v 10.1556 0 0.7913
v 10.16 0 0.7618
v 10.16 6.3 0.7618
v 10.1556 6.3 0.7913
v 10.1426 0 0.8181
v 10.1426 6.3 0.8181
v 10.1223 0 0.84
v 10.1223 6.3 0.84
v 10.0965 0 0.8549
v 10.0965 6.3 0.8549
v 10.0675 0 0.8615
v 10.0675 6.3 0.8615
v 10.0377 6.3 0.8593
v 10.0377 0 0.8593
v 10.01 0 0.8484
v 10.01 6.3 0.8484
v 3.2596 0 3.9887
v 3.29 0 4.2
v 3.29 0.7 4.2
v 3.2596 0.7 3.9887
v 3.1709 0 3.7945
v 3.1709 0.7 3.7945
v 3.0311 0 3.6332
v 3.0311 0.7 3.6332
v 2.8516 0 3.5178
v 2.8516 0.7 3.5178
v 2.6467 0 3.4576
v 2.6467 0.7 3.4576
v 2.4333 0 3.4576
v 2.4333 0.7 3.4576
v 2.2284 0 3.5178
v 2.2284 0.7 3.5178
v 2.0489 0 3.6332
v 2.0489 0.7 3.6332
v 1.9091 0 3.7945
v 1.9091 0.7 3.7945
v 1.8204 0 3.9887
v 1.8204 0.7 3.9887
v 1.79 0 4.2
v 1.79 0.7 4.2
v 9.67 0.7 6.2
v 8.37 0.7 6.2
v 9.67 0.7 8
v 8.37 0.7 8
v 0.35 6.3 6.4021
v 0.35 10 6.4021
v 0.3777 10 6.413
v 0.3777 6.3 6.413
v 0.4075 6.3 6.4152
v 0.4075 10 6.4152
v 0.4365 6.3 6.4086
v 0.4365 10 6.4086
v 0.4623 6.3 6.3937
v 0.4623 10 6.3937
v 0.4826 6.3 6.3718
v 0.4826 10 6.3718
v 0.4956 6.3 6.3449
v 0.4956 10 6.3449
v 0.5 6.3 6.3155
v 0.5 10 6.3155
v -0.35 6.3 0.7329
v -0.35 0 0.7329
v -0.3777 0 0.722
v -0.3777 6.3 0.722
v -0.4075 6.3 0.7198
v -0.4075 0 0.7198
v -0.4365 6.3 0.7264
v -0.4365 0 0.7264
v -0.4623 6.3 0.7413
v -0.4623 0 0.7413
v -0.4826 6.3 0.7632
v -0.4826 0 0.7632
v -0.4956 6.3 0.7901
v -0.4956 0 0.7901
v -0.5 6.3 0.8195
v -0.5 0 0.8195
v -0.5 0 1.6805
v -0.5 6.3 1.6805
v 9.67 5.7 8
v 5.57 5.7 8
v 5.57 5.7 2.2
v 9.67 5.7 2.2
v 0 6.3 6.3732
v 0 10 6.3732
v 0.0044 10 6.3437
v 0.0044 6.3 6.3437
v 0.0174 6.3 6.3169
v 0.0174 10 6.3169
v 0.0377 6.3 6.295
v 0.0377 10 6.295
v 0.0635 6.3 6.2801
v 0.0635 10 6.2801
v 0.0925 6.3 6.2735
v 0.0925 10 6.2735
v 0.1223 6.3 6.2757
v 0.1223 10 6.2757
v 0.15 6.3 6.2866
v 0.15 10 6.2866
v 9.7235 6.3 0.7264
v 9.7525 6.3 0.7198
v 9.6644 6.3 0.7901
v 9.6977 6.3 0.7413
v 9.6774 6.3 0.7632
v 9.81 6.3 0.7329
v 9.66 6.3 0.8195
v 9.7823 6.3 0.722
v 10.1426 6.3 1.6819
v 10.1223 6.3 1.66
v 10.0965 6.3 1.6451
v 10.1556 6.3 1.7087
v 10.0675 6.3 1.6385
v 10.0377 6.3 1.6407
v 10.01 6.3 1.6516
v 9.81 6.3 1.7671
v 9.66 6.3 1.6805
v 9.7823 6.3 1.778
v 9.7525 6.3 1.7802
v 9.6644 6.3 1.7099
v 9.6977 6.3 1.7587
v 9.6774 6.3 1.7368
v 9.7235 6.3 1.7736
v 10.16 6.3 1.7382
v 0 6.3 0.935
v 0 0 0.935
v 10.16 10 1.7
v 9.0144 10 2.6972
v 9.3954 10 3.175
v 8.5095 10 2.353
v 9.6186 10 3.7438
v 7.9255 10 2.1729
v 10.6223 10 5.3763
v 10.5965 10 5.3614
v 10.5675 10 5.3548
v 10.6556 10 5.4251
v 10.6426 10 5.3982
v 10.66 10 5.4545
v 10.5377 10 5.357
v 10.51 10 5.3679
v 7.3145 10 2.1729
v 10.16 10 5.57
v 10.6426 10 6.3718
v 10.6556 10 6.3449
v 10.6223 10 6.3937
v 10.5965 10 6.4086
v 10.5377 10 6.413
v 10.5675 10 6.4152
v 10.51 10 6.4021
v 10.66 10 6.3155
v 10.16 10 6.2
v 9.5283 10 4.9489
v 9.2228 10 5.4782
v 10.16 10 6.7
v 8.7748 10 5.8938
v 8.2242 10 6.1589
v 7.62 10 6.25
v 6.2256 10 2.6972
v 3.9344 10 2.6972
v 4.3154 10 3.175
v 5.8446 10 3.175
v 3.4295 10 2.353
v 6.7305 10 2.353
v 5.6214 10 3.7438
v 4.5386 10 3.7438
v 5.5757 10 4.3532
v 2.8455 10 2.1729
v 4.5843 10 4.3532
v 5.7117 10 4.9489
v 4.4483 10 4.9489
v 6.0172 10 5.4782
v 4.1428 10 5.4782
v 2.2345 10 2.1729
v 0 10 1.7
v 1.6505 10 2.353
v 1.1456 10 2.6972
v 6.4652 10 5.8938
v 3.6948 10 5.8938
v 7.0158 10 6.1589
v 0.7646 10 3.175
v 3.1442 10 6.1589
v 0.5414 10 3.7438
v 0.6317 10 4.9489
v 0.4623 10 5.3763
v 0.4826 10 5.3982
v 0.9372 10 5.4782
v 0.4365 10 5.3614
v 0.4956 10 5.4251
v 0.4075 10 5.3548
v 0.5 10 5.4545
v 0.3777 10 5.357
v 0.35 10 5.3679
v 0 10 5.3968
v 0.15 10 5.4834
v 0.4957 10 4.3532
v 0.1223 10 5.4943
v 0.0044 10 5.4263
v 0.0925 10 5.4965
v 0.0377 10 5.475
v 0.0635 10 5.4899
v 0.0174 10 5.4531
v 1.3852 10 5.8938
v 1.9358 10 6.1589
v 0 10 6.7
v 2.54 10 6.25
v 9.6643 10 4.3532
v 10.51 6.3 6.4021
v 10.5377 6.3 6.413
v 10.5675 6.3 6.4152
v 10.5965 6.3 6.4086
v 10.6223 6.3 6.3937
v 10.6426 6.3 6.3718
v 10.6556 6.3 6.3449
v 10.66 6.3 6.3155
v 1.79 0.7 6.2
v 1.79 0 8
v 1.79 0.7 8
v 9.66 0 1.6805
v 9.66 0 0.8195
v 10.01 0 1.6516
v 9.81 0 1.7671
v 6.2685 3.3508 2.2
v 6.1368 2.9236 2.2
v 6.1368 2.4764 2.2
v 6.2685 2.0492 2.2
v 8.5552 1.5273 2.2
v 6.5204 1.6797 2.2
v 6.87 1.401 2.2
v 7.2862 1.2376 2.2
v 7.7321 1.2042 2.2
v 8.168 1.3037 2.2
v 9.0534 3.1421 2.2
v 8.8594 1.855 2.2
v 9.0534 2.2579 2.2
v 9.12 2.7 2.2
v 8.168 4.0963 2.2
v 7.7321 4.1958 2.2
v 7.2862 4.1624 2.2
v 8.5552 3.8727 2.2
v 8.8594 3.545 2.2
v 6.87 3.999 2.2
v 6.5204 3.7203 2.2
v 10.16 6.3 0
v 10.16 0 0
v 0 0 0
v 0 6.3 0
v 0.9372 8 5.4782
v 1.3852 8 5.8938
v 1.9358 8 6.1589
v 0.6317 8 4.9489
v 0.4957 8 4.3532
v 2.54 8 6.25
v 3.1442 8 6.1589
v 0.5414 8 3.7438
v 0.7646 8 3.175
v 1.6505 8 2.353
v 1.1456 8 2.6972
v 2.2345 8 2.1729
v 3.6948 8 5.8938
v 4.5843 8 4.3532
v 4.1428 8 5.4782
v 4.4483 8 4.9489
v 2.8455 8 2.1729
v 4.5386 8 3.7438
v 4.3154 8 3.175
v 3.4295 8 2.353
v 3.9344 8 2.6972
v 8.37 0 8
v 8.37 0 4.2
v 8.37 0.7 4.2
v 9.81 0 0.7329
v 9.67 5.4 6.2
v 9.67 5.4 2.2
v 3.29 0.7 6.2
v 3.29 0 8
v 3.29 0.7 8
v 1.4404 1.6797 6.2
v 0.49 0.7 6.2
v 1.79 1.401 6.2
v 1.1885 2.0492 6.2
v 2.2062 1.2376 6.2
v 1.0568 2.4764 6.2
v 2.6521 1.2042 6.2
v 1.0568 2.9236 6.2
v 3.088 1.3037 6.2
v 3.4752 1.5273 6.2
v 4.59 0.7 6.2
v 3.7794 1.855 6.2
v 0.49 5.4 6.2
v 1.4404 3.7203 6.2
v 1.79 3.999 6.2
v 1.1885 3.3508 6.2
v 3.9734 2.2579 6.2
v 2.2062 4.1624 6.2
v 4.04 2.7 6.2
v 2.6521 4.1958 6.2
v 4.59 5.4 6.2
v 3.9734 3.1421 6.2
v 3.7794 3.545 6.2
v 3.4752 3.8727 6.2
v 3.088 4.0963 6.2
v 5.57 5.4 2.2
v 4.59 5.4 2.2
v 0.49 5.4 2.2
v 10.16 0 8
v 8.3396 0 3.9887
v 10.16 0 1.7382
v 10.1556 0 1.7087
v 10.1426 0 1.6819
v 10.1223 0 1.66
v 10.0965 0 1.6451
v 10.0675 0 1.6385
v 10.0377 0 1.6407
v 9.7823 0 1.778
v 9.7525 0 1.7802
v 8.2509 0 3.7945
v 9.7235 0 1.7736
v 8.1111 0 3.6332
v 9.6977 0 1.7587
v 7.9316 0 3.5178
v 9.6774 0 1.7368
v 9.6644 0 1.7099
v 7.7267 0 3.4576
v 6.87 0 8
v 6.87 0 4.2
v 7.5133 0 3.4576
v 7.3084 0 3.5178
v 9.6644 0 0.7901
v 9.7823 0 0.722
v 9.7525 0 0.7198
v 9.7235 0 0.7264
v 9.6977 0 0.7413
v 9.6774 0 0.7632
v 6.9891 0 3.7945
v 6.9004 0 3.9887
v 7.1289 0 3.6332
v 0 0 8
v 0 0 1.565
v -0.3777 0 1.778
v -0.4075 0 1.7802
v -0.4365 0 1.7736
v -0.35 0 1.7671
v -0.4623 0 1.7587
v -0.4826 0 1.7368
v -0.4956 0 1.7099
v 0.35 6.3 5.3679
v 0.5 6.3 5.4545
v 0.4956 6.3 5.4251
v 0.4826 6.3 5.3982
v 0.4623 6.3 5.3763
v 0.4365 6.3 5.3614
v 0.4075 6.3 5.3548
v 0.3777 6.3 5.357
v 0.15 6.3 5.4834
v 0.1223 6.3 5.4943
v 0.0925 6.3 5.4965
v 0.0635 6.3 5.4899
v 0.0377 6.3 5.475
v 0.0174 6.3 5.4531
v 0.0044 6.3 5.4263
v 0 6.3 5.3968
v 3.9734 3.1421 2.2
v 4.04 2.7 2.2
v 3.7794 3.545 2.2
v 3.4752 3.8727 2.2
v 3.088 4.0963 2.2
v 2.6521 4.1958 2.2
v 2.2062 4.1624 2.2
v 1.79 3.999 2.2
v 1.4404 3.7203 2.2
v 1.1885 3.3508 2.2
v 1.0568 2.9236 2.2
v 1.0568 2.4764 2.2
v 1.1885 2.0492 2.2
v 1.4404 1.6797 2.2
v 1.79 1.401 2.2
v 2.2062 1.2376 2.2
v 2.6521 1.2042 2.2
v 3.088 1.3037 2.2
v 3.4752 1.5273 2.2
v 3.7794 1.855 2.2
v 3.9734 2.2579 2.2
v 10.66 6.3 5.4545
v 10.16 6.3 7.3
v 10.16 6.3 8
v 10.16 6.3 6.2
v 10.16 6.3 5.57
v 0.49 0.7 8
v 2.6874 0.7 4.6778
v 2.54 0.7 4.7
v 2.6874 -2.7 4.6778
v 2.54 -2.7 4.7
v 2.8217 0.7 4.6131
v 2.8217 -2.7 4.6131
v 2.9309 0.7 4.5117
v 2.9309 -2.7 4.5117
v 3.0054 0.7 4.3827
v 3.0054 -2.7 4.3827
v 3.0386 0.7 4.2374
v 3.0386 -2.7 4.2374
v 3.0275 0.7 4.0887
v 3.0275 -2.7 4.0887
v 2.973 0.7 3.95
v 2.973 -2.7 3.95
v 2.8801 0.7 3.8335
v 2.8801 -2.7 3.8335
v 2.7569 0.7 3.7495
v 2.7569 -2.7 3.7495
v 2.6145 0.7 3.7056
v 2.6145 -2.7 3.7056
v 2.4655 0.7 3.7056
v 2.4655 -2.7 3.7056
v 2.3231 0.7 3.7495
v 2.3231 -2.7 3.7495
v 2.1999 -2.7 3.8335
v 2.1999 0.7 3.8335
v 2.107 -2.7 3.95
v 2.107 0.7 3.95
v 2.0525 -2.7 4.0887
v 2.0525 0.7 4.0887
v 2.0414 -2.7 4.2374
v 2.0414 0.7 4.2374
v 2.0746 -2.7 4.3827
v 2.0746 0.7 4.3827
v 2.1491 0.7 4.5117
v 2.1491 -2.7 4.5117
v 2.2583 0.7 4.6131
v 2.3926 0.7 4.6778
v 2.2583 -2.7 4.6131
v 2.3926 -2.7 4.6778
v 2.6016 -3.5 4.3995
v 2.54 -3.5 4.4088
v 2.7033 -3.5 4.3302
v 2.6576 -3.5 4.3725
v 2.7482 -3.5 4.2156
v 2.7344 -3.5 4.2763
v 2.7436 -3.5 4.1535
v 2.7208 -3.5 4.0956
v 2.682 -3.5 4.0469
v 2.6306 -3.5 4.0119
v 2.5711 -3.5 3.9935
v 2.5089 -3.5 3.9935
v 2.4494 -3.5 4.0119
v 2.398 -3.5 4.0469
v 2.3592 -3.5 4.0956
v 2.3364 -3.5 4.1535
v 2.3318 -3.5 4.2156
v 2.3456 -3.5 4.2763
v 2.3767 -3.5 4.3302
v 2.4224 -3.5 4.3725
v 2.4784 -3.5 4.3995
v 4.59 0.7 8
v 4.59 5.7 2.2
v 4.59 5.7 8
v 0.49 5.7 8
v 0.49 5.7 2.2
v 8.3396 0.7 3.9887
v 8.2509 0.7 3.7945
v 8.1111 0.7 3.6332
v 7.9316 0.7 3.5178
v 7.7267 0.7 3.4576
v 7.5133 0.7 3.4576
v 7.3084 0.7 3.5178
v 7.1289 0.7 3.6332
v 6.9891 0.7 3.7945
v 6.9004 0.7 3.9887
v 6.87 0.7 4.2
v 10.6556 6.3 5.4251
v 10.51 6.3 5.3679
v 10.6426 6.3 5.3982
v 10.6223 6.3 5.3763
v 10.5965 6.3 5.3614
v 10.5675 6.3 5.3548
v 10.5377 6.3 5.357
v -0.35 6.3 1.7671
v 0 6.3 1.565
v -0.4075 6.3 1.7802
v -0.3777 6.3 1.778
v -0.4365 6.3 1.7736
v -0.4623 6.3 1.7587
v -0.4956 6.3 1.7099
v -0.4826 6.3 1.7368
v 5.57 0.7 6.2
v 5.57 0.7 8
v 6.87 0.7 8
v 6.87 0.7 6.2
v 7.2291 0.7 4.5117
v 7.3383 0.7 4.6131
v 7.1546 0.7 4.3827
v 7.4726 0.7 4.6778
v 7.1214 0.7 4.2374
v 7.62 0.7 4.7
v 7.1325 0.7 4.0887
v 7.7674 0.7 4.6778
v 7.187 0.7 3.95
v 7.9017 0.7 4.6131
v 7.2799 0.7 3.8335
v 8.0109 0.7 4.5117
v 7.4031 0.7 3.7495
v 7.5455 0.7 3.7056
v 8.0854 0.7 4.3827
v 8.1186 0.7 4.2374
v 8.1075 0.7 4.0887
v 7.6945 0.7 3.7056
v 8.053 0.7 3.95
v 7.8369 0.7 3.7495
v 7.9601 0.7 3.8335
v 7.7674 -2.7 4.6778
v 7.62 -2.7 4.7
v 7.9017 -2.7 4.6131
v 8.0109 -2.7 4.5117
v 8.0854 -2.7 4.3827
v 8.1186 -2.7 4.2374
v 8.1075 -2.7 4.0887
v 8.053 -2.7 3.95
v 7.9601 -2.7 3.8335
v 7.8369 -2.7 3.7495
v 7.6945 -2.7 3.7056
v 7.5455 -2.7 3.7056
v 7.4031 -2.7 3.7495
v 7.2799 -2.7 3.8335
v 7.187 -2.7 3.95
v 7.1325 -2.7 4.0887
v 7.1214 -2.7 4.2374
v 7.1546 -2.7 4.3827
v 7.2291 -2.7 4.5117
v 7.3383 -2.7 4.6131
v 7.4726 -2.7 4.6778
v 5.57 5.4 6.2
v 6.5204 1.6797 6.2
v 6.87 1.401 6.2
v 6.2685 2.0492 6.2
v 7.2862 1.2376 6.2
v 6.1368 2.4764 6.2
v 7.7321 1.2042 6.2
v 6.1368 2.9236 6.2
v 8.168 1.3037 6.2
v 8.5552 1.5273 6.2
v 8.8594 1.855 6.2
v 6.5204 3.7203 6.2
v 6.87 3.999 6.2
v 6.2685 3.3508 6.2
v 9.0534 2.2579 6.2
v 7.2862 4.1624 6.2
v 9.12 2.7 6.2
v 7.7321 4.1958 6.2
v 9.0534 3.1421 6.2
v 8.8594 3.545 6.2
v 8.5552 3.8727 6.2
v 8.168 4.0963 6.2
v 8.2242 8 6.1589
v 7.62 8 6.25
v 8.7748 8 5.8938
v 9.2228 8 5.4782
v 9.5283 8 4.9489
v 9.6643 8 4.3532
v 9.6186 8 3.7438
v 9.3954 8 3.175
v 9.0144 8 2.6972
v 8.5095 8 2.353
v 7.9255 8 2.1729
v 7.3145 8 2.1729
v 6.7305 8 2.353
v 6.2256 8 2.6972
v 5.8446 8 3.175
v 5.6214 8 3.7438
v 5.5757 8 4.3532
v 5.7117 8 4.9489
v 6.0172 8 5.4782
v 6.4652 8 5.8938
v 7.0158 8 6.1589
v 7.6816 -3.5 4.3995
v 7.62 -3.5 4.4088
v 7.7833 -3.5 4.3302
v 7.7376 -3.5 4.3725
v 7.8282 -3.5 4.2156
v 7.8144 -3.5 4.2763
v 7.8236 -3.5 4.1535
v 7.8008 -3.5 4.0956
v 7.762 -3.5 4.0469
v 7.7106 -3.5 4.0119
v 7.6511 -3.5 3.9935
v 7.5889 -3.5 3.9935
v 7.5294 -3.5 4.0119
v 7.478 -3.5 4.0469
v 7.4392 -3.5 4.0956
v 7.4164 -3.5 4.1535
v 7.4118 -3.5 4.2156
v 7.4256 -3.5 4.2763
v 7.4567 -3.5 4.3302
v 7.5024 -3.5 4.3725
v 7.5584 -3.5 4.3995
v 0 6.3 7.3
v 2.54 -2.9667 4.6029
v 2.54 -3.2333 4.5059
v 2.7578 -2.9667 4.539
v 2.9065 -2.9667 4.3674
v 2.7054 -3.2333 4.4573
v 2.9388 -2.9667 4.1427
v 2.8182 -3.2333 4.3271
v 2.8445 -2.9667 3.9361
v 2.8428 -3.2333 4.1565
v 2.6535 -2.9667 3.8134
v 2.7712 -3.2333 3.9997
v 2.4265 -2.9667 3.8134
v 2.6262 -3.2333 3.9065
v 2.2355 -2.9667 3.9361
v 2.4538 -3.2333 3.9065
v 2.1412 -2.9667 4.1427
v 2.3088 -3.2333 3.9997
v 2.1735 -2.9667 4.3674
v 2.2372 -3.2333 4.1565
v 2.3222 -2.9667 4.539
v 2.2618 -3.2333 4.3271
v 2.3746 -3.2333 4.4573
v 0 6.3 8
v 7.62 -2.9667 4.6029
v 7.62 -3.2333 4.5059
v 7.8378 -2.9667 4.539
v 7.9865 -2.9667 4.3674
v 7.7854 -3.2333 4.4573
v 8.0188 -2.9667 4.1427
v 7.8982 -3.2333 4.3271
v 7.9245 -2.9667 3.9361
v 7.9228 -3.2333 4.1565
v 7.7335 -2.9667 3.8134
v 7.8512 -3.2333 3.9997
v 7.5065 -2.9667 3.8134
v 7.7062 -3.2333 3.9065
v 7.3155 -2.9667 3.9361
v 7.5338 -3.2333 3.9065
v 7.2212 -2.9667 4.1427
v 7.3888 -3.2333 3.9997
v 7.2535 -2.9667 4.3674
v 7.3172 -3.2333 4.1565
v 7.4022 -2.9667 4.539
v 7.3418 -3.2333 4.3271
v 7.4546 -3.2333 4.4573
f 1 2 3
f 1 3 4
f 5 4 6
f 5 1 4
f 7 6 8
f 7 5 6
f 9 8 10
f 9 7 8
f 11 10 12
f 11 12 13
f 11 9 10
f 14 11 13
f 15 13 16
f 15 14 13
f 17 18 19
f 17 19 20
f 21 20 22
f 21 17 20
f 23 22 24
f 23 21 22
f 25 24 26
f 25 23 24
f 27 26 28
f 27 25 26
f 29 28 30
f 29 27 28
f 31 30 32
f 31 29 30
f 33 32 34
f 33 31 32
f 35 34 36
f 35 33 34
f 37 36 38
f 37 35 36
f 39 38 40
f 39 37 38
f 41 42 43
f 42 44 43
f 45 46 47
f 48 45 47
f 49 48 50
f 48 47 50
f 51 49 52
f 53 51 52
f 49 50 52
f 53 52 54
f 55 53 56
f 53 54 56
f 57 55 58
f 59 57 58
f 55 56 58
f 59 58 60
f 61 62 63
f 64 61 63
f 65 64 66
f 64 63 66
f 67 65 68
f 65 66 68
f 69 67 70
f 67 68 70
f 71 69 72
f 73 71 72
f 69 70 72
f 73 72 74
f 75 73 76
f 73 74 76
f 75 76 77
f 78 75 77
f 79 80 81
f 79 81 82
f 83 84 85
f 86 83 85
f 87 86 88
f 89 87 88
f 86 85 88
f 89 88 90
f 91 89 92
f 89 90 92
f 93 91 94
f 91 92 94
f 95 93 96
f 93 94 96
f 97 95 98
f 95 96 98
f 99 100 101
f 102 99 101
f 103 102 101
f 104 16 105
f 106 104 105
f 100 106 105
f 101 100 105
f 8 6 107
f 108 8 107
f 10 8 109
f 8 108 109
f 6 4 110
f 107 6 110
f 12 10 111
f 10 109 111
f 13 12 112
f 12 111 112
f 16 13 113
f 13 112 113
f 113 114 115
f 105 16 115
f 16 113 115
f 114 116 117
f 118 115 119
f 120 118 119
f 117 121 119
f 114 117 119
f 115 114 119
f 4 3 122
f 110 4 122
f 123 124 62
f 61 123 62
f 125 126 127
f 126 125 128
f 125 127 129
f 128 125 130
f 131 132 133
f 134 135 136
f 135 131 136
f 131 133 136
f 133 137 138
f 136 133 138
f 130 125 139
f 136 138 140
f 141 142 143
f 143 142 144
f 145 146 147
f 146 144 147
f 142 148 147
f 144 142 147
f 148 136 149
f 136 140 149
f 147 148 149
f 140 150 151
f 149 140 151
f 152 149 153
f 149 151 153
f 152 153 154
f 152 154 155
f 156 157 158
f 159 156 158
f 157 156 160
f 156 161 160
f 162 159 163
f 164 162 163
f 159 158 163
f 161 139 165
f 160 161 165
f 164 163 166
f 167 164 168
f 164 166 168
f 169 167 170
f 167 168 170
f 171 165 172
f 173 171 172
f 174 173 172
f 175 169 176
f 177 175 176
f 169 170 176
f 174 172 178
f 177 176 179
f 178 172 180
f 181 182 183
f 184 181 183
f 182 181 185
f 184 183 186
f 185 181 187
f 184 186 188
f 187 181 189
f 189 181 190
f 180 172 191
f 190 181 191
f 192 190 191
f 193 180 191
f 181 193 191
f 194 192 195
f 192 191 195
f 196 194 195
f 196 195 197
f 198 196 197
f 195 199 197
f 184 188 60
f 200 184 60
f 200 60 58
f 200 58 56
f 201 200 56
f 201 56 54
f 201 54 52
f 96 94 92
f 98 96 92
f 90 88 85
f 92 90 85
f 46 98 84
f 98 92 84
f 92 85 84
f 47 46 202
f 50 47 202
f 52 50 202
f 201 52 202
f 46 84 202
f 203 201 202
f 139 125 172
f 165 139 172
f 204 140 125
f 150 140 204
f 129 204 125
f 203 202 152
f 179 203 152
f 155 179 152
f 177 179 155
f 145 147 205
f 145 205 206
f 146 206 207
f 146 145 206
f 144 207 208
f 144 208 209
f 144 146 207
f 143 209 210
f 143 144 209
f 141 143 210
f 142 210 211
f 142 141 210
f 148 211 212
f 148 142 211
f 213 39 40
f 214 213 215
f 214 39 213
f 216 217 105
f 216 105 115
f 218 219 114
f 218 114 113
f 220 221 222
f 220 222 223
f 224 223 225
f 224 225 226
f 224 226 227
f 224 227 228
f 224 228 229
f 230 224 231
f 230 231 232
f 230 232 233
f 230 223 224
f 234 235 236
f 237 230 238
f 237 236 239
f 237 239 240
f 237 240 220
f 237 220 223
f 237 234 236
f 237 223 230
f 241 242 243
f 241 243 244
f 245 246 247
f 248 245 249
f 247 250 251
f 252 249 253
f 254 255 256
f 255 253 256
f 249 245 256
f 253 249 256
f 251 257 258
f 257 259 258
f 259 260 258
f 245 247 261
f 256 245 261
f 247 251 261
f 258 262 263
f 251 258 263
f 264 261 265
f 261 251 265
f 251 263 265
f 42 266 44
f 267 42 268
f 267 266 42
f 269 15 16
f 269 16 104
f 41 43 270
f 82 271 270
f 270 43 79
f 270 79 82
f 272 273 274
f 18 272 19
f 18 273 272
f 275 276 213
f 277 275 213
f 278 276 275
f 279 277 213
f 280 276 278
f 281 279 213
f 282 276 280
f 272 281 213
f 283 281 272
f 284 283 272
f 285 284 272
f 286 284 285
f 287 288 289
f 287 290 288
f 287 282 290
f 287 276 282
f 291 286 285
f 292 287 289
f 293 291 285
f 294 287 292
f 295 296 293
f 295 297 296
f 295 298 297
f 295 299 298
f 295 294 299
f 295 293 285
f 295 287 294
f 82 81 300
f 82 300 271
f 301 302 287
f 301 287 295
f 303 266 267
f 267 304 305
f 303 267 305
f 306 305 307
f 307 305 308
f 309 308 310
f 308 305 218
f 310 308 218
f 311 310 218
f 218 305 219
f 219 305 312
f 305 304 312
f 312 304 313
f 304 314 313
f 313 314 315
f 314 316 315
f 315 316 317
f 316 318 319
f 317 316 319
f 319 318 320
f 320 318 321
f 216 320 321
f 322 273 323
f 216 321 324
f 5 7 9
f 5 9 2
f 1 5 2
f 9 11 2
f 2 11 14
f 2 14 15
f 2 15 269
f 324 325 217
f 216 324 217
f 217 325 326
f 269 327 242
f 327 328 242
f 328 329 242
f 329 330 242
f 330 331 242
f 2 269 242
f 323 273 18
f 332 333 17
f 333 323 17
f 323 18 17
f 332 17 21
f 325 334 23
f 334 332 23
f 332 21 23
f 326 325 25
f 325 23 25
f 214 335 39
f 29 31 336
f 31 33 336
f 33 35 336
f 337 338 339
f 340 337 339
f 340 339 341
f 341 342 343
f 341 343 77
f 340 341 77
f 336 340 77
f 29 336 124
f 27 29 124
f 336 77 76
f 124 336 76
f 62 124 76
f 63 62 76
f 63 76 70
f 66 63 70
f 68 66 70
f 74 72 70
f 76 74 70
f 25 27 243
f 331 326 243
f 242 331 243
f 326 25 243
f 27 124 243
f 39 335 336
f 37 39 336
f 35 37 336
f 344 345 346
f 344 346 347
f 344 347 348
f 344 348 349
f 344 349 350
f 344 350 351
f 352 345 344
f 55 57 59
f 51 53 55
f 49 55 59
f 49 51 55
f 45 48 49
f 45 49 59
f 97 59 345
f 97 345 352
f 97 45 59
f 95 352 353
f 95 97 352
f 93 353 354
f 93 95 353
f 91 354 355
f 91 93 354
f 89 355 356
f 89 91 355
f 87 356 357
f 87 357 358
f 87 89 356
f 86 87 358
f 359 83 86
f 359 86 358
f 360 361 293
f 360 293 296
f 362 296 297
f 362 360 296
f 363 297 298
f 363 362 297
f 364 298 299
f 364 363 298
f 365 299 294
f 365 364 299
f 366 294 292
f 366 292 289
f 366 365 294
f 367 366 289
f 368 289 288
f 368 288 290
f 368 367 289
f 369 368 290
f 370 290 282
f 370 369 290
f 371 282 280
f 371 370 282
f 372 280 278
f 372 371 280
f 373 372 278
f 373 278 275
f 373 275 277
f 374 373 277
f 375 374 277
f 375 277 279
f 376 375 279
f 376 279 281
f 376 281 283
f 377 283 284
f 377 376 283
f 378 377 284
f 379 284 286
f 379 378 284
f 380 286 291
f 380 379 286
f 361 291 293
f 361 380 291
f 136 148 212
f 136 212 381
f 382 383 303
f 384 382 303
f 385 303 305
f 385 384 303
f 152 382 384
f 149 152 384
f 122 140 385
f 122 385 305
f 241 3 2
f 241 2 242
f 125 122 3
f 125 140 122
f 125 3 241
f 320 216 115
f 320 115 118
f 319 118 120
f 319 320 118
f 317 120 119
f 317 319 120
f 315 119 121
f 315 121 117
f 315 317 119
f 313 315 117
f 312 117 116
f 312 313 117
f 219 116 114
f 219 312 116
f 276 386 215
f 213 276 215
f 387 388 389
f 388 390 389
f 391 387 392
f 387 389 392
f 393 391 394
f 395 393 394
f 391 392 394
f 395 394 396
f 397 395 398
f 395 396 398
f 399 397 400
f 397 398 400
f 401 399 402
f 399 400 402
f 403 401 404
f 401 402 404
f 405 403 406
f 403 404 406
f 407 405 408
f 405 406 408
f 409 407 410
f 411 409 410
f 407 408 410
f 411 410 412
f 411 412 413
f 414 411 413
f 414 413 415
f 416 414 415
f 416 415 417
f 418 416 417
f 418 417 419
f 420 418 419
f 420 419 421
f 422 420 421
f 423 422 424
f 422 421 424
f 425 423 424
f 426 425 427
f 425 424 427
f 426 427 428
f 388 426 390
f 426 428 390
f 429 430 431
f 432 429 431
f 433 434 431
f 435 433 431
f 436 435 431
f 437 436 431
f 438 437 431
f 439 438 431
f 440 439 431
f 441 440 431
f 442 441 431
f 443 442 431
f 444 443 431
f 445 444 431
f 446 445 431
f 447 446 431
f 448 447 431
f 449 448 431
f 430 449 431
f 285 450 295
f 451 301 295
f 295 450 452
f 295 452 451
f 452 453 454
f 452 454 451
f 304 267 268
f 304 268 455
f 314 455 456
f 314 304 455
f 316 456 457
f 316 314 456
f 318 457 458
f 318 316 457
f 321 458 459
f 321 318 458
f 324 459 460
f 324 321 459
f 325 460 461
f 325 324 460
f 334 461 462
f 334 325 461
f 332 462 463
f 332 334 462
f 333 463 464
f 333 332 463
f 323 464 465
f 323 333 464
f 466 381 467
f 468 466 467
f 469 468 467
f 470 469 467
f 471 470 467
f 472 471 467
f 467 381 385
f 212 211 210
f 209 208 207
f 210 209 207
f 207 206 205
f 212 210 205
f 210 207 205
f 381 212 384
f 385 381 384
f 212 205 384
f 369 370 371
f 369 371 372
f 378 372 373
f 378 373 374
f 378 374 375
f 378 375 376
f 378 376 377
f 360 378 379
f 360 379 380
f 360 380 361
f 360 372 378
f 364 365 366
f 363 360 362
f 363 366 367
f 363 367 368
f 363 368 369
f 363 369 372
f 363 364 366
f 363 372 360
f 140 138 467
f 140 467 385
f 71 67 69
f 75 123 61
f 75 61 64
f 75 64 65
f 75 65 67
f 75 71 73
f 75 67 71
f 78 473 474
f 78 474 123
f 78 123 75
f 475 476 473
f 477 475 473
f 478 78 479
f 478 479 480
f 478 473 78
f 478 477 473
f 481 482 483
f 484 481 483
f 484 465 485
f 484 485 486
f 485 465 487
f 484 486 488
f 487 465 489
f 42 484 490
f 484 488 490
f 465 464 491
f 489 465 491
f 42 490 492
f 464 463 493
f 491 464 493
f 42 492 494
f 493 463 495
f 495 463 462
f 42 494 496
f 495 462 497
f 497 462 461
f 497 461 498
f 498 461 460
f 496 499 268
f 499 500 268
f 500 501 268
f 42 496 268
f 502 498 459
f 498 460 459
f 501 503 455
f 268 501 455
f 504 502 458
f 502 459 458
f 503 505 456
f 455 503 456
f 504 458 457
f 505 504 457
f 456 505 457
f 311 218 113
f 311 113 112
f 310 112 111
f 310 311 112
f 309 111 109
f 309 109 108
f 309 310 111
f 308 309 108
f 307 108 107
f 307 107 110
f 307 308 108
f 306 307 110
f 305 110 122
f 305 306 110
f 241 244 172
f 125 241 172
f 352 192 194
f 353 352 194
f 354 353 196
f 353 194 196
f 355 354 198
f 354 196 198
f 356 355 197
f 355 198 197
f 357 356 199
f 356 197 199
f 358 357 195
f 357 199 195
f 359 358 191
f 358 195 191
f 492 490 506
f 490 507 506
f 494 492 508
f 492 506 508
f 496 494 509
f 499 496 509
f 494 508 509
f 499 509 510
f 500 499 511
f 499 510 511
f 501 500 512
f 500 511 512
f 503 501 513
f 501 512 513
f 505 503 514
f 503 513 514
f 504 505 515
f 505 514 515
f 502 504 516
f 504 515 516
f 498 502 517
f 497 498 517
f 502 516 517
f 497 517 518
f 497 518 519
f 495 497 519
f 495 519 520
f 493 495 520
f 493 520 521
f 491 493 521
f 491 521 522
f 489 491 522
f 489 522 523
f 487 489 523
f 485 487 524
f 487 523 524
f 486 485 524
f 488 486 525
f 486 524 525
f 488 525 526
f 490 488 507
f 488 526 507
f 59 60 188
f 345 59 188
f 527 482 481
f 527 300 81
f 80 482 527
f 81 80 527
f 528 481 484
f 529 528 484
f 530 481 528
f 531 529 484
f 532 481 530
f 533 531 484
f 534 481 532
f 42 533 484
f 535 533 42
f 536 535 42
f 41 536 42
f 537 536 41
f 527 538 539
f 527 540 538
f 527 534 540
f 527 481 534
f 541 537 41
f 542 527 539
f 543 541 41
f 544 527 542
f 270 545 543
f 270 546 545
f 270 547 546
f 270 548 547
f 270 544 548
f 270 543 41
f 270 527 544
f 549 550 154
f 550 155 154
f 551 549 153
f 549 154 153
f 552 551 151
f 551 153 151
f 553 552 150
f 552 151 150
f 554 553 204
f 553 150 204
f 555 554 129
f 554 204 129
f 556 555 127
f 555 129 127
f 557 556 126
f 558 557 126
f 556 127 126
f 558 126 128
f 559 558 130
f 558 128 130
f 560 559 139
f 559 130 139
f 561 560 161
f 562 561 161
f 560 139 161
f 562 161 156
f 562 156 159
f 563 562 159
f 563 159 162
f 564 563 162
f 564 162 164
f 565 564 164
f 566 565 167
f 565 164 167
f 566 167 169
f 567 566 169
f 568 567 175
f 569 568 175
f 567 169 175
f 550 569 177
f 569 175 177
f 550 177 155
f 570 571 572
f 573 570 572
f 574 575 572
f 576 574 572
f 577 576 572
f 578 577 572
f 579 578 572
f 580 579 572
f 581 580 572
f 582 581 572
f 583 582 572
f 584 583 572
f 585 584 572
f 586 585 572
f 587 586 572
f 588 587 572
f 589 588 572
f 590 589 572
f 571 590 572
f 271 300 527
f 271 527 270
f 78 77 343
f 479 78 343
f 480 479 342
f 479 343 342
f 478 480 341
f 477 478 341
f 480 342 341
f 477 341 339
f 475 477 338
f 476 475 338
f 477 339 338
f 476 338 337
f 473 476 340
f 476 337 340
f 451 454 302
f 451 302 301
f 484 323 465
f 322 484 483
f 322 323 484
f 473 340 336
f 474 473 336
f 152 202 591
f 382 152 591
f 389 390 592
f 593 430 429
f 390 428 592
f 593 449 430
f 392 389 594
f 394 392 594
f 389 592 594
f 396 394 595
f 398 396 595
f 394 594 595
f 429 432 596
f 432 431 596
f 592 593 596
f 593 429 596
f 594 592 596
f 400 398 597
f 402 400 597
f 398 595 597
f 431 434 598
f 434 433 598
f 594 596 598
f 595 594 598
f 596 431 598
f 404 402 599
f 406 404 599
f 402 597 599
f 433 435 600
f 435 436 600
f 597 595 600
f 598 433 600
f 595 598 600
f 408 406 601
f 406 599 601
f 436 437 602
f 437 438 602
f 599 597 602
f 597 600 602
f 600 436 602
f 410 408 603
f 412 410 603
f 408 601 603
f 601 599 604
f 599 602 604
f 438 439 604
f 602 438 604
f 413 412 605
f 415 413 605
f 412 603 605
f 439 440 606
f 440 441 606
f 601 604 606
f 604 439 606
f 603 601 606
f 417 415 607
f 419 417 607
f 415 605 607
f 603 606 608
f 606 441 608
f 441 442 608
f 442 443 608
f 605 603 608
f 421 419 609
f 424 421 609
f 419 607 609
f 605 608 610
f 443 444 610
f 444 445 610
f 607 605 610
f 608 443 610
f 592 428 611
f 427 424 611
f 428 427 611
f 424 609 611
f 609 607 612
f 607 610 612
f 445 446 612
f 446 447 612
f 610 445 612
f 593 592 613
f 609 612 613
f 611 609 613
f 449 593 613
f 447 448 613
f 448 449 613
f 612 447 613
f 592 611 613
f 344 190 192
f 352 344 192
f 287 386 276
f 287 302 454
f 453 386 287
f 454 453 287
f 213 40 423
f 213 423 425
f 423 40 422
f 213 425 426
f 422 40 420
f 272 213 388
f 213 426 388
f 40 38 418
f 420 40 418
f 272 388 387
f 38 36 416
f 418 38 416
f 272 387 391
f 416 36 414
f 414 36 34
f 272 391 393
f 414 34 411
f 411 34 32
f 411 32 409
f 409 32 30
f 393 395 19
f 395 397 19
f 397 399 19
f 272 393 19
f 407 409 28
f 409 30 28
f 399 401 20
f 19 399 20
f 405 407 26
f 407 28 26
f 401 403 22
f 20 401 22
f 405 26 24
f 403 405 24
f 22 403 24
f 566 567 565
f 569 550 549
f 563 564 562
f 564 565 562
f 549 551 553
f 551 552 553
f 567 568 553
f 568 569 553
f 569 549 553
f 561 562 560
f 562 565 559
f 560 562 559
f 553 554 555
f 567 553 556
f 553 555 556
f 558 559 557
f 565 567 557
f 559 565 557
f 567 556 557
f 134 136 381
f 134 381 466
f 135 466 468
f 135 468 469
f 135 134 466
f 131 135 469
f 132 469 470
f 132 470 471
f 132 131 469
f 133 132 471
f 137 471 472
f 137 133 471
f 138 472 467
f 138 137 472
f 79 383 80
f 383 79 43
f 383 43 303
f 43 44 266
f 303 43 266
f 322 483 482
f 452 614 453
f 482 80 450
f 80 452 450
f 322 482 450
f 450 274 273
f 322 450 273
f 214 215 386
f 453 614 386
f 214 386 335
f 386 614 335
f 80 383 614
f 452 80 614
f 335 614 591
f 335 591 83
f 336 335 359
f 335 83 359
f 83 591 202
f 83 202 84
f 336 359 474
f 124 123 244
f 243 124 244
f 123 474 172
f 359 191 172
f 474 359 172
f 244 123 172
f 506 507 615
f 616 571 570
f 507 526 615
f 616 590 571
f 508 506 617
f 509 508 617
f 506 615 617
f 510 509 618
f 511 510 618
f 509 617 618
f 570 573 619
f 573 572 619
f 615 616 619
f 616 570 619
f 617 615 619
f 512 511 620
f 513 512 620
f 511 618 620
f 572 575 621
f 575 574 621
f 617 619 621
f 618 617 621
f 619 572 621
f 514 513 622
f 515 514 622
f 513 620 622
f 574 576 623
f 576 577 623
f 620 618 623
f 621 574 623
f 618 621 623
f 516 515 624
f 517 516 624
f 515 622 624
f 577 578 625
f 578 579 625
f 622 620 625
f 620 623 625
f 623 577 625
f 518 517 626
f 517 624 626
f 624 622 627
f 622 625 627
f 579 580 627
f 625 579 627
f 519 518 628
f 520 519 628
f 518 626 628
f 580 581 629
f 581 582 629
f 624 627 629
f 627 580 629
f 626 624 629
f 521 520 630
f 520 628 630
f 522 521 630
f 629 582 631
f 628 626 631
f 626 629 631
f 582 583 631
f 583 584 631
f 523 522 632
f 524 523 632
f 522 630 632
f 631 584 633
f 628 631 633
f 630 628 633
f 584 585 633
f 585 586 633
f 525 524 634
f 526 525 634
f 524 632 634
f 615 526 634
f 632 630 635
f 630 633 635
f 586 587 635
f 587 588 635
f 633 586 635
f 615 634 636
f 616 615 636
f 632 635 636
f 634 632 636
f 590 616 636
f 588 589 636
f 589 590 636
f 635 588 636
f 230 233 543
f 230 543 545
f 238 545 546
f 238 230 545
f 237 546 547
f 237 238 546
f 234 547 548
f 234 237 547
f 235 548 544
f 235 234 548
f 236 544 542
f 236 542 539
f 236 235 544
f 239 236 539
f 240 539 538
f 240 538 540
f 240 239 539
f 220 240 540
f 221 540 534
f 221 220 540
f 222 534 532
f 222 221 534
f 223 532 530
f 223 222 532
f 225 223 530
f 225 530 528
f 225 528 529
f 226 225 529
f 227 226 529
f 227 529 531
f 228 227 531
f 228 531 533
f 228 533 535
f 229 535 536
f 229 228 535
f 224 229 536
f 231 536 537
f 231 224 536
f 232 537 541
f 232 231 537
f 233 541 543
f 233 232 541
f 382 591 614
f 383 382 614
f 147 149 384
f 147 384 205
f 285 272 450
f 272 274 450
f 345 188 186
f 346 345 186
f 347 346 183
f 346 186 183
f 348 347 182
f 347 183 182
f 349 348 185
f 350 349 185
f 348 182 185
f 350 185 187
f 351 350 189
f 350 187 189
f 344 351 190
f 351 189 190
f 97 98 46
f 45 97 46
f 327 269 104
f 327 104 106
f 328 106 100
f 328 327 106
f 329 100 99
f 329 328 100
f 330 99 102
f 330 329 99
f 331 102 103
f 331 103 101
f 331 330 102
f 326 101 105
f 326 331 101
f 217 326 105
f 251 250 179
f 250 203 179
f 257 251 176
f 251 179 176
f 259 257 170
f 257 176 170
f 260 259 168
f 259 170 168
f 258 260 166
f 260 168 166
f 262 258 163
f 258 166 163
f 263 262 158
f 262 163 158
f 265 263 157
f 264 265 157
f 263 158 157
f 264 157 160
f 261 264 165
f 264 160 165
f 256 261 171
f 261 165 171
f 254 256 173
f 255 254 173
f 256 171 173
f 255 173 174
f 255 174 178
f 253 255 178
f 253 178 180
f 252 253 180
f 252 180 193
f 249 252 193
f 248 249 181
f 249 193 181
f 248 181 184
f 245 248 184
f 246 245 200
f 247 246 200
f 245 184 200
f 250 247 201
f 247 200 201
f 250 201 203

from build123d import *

# Parameters (mm, degrees)
BOSS_EXTRUDE1_DEPTH      = 10.16
SKETCH2_W                = 4.1
SKETCH2_H                = 5
CUT_EXTRUDE1_DEPTH       = 5.8
SKETCH3_W                = 4.1
SKETCH3_H                = 5
CUT_EXTRUDE2_DEPTH       = 5.8
CUT_EXTRUDE3_DEPTH       = 1
CUT_EXTRUDE4_DEPTH       = 1
BOSS_EXTRUDE2_DEPTH      = 2
BOSS_EXTRUDE2_DEPTH_BACK = 2
SKETCH6_W                = 4.1
SKETCH6_H                = 4.7
SKETCH6_R                = 1.5
BOSS_EXTRUDE3_DEPTH      = 2
BOSS_EXTRUDE3_DEPTH_BACK = 2
SKETCH7_W                = 4.1
SKETCH7_H                = 4.7
SKETCH7_R                = 1.5
SKETCH10_W               = 2.05
SKETCH10_H               = 2
SKETCH11_W               = 2.05
SKETCH11_H               = 2
BOSS_EXTRUDE4_DEPTH      = 6.3
CUT_EXTRUDE5_DEPTH       = 6.3
CUT_EXTRUDE6_DEPTH       = 3.7
BOSS_EXTRUDE5_DEPTH      = 3.7


with BuildPart() as part:
    # Sketch1 → Boss-Extrude1 (new body)
    with BuildSketch(Plane(origin=(0, 0, 0), x_dir=(0, 0, -1), z_dir=(1, 0, 0))):
        Polygon((-8, 0), (0, 0), (0, 6.3), (-1.7, 10), (-6.7, 10), (-7.3, 6.3), (-8, 6.3), align=None)
    extrude(amount=BOSS_EXTRUDE1_DEPTH)

    # Sketch2 → Cut-Extrude1 (cut)
    with BuildSketch(Plane.XY.offset(8)):
        with Locations((2.54, 3.2)):
            Rectangle(SKETCH2_W, SKETCH2_H)
    extrude(amount=-CUT_EXTRUDE1_DEPTH, mode=Mode.SUBTRACT)

    # Sketch3 → Cut-Extrude2 (cut)
    with BuildSketch(Plane.XY.offset(8)):
        with Locations((7.62, 3.2)):
            Rectangle(SKETCH3_W, SKETCH3_H)
    extrude(amount=-CUT_EXTRUDE2_DEPTH, mode=Mode.SUBTRACT)

    # Sketch4 → Cut-Extrude3 (cut)
    with BuildSketch(Plane(origin=(0, 0, 0), x_dir=(-1, 0, 0), z_dir=(0, 1, 0))):
        with BuildLine():
            Line((-1.79, 4.2), (-1.79, 8))
            Line((-1.79, 8), (-3.29, 8))
            Line((-3.29, 8), (-3.29, 4.2))
            ThreePointArc((-3.29, 4.2), (-2.54, 3.45), (-1.79, 4.2))
        make_face()
    extrude(amount=CUT_EXTRUDE3_DEPTH, mode=Mode.SUBTRACT)

    # Sketch5 → Cut-Extrude4 (cut)
    with BuildSketch(Plane(origin=(0, 0, 0), x_dir=(-1, 0, 0), z_dir=(0, 1, 0))):
        with BuildLine():
            Line((-6.87, 4.2), (-6.87, 8))
            Line((-6.87, 8), (-8.37, 8))
            Line((-8.37, 8), (-8.37, 4.2))
            ThreePointArc((-8.37, 4.2), (-7.62, 3.45), (-6.87, 4.2))
        make_face()
    extrude(amount=CUT_EXTRUDE4_DEPTH, mode=Mode.SUBTRACT)

    # Sketch6 → Boss-Extrude2 (add, two sides: drawn at the far end of the back side and taken through both)
    with BuildSketch(Plane.XY.offset(4.2).offset(-BOSS_EXTRUDE2_DEPTH_BACK)):
        with Locations((2.54, 3.05)):
            Rectangle(SKETCH6_W, SKETCH6_H)
        with Locations((2.54, 2.7)):
            Circle(SKETCH6_R, mode=Mode.SUBTRACT)
    extrude(amount=BOSS_EXTRUDE2_DEPTH + BOSS_EXTRUDE2_DEPTH_BACK)

    # Sketch7 → Boss-Extrude3 (add, two sides: drawn at the far end of the back side and taken through both)
    with BuildSketch(Plane.XY.offset(4.2).offset(-BOSS_EXTRUDE3_DEPTH_BACK)):
        with Locations((7.62, 3.05)):
            Rectangle(SKETCH7_W, SKETCH7_H)
        with Locations((7.62, 2.7)):
            Circle(SKETCH7_R, mode=Mode.SUBTRACT)
    extrude(amount=BOSS_EXTRUDE3_DEPTH + BOSS_EXTRUDE3_DEPTH_BACK)

    # Sketch8 → Revolve1 (revolve)
    with BuildSketch(Plane.XY.offset(4.2), mode=Mode.PRIVATE) as revolve1_sk:
        Polygon((2.54, 0.7), (3.04, 0.7), (3.04, -2.7), (2.748823813, -3.5), (2.54, -3.5), align=None)
    revolve(revolve1_sk.sketch.rotate(Axis((2.54, -3.5, 4.2), (0, 1, 0)), 270), axis=Axis((2.54, -3.5, 4.2), (0, 1, 0)))

    # Sketch9 → Revolve2 (revolve)
    with BuildSketch(Plane.XY.offset(4.2), mode=Mode.PRIVATE) as revolve2_sk:
        Polygon((7.62, 0.7), (8.12, 0.7), (8.12, -2.7), (7.828823813, -3.5), (7.62, -3.5), align=None)
    revolve(revolve2_sk.sketch.rotate(Axis((7.62, -3.5, 4.2), (0, 1, 0)), 270), axis=Axis((7.62, -3.5, 4.2), (0, 1, 0)))

    # Sketch10 → Cut-Revolve1 (revolve, cut)
    with BuildSketch(Plane.XY.offset(4.2), mode=Mode.PRIVATE) as cut_revolve1_sk:
        with Locations((3.565, 9)):
            Rectangle(SKETCH10_W, SKETCH10_H)
    revolve(cut_revolve1_sk.sketch.rotate(Axis((2.54, 8, 4.2), (0, 1, 0)), 270), axis=Axis((2.54, 8, 4.2), (0, 1, 0)), mode=Mode.SUBTRACT)

    # Sketch11 → Cut-Revolve2 (revolve, cut)
    with BuildSketch(Plane.XY.offset(4.2), mode=Mode.PRIVATE) as cut_revolve2_sk:
        with Locations((8.645, 9)):
            Rectangle(SKETCH11_W, SKETCH11_H)
    revolve(cut_revolve2_sk.sketch.rotate(Axis((7.62, 8, 4.2), (0, 1, 0)), 270), axis=Axis((7.62, 8, 4.2), (0, 1, 0)), mode=Mode.SUBTRACT)

    # Sketch12 → Boss-Extrude4 (add)
    with BuildSketch(Plane(origin=(0, 0, 0), x_dir=(-1, 0, 0), z_dir=(0, 1, 0))):
        with BuildLine():
            Line((0.35, 1.767072594), (0, 1.565))
            Line((0, 1.565), (0, 0.935))
            Line((0, 0.935), (0.35, 0.732927406))
            ThreePointArc((0.35, 0.732927406), (0.45, 0.732927406), (0.5, 0.819529946))
            Line((0.5, 0.819529946), (0.5, 1.680470054))
            ThreePointArc((0.5, 1.680470054), (0.45, 1.767072594), (0.35, 1.767072594))
        make_face()
    extrude(amount=BOSS_EXTRUDE4_DEPTH)

    # Sketch13 → Cut-Extrude5 (cut)
    with BuildSketch(Plane(origin=(0, 0, 0), x_dir=(-1, 0, 0), z_dir=(0, 1, 0))):
        with BuildLine():
            Line((-9.81, 1.767072594), (-10.01, 1.65160254))
            ThreePointArc((-10.01, 1.65160254), (-10.11, 1.65160254), (-10.16, 1.738205081))
            Line((-10.16, 1.738205081), (-10.16, 1.865))
            Line((-10.16, 1.865), (-10.46, 1.865))
            Line((-10.46, 1.865), (-10.46, 0.635))
            Line((-10.46, 0.635), (-10.16, 0.635))
            Line((-10.16, 0.635), (-10.16, 0.761794919))
            ThreePointArc((-10.16, 0.761794919), (-10.11, 0.84839746), (-10.01, 0.84839746))
            Line((-10.01, 0.84839746), (-9.81, 0.732927406))
            ThreePointArc((-9.81, 0.732927406), (-9.71, 0.732927406), (-9.66, 0.819529946))
            Line((-9.66, 0.819529946), (-9.66, 1.680470054))
            ThreePointArc((-9.66, 1.680470054), (-9.71, 1.767072594), (-9.81, 1.767072594))
        make_face()
    extrude(amount=CUT_EXTRUDE5_DEPTH, mode=Mode.SUBTRACT)

    # Sketch14 → Cut-Extrude6 (cut)
    with BuildSketch(Plane(origin=(0, 10, 0), x_dir=(-1, 0, 0), z_dir=(0, 1, 0))):
        with BuildLine():
            Line((0.2, 6.4), (0, 6.4))
            Line((0, 6.4), (0, 6.373205081))
            ThreePointArc((0, 6.373205081), (-0.05, 6.28660254), (-0.15, 6.28660254))
            Line((-0.15, 6.28660254), (-0.35, 6.402072594))
            ThreePointArc((-0.35, 6.402072594), (-0.45, 6.402072594), (-0.5, 6.315470054))
            Line((-0.5, 6.315470054), (-0.5, 5.454529946))
            ThreePointArc((-0.5, 5.454529946), (-0.45, 5.367927406), (-0.35, 5.367927406))
            Line((-0.35, 5.367927406), (-0.15, 5.48339746))
            ThreePointArc((-0.15, 5.48339746), (-0.05, 5.48339746), (0, 5.396794919))
            Line((0, 5.396794919), (0, 5.37))
            Line((0, 5.37), (0.2, 5.37))
            Line((0.2, 5.37), (0.2, 6.4))
        make_face()
    extrude(amount=-CUT_EXTRUDE6_DEPTH, mode=Mode.SUBTRACT)

    # Sketch15 → Boss-Extrude5 (add)
    with BuildSketch(Plane(origin=(0, 10, 0), x_dir=(-1, 0, 0), z_dir=(0, 1, 0))):
        with BuildLine():
            Line((-10.16, 6.2), (-10.51, 6.402072594))
            ThreePointArc((-10.51, 6.402072594), (-10.61, 6.402072594), (-10.66, 6.315470054))
            Line((-10.66, 6.315470054), (-10.66, 5.454529946))
            ThreePointArc((-10.66, 5.454529946), (-10.61, 5.367927406), (-10.51, 5.367927406))
            Line((-10.51, 5.367927406), (-10.16, 5.57))
            Line((-10.16, 5.57), (-10.16, 6.2))
        make_face()
    extrude(amount=-BOSS_EXTRUDE5_DEPTH)


solid = part.part
